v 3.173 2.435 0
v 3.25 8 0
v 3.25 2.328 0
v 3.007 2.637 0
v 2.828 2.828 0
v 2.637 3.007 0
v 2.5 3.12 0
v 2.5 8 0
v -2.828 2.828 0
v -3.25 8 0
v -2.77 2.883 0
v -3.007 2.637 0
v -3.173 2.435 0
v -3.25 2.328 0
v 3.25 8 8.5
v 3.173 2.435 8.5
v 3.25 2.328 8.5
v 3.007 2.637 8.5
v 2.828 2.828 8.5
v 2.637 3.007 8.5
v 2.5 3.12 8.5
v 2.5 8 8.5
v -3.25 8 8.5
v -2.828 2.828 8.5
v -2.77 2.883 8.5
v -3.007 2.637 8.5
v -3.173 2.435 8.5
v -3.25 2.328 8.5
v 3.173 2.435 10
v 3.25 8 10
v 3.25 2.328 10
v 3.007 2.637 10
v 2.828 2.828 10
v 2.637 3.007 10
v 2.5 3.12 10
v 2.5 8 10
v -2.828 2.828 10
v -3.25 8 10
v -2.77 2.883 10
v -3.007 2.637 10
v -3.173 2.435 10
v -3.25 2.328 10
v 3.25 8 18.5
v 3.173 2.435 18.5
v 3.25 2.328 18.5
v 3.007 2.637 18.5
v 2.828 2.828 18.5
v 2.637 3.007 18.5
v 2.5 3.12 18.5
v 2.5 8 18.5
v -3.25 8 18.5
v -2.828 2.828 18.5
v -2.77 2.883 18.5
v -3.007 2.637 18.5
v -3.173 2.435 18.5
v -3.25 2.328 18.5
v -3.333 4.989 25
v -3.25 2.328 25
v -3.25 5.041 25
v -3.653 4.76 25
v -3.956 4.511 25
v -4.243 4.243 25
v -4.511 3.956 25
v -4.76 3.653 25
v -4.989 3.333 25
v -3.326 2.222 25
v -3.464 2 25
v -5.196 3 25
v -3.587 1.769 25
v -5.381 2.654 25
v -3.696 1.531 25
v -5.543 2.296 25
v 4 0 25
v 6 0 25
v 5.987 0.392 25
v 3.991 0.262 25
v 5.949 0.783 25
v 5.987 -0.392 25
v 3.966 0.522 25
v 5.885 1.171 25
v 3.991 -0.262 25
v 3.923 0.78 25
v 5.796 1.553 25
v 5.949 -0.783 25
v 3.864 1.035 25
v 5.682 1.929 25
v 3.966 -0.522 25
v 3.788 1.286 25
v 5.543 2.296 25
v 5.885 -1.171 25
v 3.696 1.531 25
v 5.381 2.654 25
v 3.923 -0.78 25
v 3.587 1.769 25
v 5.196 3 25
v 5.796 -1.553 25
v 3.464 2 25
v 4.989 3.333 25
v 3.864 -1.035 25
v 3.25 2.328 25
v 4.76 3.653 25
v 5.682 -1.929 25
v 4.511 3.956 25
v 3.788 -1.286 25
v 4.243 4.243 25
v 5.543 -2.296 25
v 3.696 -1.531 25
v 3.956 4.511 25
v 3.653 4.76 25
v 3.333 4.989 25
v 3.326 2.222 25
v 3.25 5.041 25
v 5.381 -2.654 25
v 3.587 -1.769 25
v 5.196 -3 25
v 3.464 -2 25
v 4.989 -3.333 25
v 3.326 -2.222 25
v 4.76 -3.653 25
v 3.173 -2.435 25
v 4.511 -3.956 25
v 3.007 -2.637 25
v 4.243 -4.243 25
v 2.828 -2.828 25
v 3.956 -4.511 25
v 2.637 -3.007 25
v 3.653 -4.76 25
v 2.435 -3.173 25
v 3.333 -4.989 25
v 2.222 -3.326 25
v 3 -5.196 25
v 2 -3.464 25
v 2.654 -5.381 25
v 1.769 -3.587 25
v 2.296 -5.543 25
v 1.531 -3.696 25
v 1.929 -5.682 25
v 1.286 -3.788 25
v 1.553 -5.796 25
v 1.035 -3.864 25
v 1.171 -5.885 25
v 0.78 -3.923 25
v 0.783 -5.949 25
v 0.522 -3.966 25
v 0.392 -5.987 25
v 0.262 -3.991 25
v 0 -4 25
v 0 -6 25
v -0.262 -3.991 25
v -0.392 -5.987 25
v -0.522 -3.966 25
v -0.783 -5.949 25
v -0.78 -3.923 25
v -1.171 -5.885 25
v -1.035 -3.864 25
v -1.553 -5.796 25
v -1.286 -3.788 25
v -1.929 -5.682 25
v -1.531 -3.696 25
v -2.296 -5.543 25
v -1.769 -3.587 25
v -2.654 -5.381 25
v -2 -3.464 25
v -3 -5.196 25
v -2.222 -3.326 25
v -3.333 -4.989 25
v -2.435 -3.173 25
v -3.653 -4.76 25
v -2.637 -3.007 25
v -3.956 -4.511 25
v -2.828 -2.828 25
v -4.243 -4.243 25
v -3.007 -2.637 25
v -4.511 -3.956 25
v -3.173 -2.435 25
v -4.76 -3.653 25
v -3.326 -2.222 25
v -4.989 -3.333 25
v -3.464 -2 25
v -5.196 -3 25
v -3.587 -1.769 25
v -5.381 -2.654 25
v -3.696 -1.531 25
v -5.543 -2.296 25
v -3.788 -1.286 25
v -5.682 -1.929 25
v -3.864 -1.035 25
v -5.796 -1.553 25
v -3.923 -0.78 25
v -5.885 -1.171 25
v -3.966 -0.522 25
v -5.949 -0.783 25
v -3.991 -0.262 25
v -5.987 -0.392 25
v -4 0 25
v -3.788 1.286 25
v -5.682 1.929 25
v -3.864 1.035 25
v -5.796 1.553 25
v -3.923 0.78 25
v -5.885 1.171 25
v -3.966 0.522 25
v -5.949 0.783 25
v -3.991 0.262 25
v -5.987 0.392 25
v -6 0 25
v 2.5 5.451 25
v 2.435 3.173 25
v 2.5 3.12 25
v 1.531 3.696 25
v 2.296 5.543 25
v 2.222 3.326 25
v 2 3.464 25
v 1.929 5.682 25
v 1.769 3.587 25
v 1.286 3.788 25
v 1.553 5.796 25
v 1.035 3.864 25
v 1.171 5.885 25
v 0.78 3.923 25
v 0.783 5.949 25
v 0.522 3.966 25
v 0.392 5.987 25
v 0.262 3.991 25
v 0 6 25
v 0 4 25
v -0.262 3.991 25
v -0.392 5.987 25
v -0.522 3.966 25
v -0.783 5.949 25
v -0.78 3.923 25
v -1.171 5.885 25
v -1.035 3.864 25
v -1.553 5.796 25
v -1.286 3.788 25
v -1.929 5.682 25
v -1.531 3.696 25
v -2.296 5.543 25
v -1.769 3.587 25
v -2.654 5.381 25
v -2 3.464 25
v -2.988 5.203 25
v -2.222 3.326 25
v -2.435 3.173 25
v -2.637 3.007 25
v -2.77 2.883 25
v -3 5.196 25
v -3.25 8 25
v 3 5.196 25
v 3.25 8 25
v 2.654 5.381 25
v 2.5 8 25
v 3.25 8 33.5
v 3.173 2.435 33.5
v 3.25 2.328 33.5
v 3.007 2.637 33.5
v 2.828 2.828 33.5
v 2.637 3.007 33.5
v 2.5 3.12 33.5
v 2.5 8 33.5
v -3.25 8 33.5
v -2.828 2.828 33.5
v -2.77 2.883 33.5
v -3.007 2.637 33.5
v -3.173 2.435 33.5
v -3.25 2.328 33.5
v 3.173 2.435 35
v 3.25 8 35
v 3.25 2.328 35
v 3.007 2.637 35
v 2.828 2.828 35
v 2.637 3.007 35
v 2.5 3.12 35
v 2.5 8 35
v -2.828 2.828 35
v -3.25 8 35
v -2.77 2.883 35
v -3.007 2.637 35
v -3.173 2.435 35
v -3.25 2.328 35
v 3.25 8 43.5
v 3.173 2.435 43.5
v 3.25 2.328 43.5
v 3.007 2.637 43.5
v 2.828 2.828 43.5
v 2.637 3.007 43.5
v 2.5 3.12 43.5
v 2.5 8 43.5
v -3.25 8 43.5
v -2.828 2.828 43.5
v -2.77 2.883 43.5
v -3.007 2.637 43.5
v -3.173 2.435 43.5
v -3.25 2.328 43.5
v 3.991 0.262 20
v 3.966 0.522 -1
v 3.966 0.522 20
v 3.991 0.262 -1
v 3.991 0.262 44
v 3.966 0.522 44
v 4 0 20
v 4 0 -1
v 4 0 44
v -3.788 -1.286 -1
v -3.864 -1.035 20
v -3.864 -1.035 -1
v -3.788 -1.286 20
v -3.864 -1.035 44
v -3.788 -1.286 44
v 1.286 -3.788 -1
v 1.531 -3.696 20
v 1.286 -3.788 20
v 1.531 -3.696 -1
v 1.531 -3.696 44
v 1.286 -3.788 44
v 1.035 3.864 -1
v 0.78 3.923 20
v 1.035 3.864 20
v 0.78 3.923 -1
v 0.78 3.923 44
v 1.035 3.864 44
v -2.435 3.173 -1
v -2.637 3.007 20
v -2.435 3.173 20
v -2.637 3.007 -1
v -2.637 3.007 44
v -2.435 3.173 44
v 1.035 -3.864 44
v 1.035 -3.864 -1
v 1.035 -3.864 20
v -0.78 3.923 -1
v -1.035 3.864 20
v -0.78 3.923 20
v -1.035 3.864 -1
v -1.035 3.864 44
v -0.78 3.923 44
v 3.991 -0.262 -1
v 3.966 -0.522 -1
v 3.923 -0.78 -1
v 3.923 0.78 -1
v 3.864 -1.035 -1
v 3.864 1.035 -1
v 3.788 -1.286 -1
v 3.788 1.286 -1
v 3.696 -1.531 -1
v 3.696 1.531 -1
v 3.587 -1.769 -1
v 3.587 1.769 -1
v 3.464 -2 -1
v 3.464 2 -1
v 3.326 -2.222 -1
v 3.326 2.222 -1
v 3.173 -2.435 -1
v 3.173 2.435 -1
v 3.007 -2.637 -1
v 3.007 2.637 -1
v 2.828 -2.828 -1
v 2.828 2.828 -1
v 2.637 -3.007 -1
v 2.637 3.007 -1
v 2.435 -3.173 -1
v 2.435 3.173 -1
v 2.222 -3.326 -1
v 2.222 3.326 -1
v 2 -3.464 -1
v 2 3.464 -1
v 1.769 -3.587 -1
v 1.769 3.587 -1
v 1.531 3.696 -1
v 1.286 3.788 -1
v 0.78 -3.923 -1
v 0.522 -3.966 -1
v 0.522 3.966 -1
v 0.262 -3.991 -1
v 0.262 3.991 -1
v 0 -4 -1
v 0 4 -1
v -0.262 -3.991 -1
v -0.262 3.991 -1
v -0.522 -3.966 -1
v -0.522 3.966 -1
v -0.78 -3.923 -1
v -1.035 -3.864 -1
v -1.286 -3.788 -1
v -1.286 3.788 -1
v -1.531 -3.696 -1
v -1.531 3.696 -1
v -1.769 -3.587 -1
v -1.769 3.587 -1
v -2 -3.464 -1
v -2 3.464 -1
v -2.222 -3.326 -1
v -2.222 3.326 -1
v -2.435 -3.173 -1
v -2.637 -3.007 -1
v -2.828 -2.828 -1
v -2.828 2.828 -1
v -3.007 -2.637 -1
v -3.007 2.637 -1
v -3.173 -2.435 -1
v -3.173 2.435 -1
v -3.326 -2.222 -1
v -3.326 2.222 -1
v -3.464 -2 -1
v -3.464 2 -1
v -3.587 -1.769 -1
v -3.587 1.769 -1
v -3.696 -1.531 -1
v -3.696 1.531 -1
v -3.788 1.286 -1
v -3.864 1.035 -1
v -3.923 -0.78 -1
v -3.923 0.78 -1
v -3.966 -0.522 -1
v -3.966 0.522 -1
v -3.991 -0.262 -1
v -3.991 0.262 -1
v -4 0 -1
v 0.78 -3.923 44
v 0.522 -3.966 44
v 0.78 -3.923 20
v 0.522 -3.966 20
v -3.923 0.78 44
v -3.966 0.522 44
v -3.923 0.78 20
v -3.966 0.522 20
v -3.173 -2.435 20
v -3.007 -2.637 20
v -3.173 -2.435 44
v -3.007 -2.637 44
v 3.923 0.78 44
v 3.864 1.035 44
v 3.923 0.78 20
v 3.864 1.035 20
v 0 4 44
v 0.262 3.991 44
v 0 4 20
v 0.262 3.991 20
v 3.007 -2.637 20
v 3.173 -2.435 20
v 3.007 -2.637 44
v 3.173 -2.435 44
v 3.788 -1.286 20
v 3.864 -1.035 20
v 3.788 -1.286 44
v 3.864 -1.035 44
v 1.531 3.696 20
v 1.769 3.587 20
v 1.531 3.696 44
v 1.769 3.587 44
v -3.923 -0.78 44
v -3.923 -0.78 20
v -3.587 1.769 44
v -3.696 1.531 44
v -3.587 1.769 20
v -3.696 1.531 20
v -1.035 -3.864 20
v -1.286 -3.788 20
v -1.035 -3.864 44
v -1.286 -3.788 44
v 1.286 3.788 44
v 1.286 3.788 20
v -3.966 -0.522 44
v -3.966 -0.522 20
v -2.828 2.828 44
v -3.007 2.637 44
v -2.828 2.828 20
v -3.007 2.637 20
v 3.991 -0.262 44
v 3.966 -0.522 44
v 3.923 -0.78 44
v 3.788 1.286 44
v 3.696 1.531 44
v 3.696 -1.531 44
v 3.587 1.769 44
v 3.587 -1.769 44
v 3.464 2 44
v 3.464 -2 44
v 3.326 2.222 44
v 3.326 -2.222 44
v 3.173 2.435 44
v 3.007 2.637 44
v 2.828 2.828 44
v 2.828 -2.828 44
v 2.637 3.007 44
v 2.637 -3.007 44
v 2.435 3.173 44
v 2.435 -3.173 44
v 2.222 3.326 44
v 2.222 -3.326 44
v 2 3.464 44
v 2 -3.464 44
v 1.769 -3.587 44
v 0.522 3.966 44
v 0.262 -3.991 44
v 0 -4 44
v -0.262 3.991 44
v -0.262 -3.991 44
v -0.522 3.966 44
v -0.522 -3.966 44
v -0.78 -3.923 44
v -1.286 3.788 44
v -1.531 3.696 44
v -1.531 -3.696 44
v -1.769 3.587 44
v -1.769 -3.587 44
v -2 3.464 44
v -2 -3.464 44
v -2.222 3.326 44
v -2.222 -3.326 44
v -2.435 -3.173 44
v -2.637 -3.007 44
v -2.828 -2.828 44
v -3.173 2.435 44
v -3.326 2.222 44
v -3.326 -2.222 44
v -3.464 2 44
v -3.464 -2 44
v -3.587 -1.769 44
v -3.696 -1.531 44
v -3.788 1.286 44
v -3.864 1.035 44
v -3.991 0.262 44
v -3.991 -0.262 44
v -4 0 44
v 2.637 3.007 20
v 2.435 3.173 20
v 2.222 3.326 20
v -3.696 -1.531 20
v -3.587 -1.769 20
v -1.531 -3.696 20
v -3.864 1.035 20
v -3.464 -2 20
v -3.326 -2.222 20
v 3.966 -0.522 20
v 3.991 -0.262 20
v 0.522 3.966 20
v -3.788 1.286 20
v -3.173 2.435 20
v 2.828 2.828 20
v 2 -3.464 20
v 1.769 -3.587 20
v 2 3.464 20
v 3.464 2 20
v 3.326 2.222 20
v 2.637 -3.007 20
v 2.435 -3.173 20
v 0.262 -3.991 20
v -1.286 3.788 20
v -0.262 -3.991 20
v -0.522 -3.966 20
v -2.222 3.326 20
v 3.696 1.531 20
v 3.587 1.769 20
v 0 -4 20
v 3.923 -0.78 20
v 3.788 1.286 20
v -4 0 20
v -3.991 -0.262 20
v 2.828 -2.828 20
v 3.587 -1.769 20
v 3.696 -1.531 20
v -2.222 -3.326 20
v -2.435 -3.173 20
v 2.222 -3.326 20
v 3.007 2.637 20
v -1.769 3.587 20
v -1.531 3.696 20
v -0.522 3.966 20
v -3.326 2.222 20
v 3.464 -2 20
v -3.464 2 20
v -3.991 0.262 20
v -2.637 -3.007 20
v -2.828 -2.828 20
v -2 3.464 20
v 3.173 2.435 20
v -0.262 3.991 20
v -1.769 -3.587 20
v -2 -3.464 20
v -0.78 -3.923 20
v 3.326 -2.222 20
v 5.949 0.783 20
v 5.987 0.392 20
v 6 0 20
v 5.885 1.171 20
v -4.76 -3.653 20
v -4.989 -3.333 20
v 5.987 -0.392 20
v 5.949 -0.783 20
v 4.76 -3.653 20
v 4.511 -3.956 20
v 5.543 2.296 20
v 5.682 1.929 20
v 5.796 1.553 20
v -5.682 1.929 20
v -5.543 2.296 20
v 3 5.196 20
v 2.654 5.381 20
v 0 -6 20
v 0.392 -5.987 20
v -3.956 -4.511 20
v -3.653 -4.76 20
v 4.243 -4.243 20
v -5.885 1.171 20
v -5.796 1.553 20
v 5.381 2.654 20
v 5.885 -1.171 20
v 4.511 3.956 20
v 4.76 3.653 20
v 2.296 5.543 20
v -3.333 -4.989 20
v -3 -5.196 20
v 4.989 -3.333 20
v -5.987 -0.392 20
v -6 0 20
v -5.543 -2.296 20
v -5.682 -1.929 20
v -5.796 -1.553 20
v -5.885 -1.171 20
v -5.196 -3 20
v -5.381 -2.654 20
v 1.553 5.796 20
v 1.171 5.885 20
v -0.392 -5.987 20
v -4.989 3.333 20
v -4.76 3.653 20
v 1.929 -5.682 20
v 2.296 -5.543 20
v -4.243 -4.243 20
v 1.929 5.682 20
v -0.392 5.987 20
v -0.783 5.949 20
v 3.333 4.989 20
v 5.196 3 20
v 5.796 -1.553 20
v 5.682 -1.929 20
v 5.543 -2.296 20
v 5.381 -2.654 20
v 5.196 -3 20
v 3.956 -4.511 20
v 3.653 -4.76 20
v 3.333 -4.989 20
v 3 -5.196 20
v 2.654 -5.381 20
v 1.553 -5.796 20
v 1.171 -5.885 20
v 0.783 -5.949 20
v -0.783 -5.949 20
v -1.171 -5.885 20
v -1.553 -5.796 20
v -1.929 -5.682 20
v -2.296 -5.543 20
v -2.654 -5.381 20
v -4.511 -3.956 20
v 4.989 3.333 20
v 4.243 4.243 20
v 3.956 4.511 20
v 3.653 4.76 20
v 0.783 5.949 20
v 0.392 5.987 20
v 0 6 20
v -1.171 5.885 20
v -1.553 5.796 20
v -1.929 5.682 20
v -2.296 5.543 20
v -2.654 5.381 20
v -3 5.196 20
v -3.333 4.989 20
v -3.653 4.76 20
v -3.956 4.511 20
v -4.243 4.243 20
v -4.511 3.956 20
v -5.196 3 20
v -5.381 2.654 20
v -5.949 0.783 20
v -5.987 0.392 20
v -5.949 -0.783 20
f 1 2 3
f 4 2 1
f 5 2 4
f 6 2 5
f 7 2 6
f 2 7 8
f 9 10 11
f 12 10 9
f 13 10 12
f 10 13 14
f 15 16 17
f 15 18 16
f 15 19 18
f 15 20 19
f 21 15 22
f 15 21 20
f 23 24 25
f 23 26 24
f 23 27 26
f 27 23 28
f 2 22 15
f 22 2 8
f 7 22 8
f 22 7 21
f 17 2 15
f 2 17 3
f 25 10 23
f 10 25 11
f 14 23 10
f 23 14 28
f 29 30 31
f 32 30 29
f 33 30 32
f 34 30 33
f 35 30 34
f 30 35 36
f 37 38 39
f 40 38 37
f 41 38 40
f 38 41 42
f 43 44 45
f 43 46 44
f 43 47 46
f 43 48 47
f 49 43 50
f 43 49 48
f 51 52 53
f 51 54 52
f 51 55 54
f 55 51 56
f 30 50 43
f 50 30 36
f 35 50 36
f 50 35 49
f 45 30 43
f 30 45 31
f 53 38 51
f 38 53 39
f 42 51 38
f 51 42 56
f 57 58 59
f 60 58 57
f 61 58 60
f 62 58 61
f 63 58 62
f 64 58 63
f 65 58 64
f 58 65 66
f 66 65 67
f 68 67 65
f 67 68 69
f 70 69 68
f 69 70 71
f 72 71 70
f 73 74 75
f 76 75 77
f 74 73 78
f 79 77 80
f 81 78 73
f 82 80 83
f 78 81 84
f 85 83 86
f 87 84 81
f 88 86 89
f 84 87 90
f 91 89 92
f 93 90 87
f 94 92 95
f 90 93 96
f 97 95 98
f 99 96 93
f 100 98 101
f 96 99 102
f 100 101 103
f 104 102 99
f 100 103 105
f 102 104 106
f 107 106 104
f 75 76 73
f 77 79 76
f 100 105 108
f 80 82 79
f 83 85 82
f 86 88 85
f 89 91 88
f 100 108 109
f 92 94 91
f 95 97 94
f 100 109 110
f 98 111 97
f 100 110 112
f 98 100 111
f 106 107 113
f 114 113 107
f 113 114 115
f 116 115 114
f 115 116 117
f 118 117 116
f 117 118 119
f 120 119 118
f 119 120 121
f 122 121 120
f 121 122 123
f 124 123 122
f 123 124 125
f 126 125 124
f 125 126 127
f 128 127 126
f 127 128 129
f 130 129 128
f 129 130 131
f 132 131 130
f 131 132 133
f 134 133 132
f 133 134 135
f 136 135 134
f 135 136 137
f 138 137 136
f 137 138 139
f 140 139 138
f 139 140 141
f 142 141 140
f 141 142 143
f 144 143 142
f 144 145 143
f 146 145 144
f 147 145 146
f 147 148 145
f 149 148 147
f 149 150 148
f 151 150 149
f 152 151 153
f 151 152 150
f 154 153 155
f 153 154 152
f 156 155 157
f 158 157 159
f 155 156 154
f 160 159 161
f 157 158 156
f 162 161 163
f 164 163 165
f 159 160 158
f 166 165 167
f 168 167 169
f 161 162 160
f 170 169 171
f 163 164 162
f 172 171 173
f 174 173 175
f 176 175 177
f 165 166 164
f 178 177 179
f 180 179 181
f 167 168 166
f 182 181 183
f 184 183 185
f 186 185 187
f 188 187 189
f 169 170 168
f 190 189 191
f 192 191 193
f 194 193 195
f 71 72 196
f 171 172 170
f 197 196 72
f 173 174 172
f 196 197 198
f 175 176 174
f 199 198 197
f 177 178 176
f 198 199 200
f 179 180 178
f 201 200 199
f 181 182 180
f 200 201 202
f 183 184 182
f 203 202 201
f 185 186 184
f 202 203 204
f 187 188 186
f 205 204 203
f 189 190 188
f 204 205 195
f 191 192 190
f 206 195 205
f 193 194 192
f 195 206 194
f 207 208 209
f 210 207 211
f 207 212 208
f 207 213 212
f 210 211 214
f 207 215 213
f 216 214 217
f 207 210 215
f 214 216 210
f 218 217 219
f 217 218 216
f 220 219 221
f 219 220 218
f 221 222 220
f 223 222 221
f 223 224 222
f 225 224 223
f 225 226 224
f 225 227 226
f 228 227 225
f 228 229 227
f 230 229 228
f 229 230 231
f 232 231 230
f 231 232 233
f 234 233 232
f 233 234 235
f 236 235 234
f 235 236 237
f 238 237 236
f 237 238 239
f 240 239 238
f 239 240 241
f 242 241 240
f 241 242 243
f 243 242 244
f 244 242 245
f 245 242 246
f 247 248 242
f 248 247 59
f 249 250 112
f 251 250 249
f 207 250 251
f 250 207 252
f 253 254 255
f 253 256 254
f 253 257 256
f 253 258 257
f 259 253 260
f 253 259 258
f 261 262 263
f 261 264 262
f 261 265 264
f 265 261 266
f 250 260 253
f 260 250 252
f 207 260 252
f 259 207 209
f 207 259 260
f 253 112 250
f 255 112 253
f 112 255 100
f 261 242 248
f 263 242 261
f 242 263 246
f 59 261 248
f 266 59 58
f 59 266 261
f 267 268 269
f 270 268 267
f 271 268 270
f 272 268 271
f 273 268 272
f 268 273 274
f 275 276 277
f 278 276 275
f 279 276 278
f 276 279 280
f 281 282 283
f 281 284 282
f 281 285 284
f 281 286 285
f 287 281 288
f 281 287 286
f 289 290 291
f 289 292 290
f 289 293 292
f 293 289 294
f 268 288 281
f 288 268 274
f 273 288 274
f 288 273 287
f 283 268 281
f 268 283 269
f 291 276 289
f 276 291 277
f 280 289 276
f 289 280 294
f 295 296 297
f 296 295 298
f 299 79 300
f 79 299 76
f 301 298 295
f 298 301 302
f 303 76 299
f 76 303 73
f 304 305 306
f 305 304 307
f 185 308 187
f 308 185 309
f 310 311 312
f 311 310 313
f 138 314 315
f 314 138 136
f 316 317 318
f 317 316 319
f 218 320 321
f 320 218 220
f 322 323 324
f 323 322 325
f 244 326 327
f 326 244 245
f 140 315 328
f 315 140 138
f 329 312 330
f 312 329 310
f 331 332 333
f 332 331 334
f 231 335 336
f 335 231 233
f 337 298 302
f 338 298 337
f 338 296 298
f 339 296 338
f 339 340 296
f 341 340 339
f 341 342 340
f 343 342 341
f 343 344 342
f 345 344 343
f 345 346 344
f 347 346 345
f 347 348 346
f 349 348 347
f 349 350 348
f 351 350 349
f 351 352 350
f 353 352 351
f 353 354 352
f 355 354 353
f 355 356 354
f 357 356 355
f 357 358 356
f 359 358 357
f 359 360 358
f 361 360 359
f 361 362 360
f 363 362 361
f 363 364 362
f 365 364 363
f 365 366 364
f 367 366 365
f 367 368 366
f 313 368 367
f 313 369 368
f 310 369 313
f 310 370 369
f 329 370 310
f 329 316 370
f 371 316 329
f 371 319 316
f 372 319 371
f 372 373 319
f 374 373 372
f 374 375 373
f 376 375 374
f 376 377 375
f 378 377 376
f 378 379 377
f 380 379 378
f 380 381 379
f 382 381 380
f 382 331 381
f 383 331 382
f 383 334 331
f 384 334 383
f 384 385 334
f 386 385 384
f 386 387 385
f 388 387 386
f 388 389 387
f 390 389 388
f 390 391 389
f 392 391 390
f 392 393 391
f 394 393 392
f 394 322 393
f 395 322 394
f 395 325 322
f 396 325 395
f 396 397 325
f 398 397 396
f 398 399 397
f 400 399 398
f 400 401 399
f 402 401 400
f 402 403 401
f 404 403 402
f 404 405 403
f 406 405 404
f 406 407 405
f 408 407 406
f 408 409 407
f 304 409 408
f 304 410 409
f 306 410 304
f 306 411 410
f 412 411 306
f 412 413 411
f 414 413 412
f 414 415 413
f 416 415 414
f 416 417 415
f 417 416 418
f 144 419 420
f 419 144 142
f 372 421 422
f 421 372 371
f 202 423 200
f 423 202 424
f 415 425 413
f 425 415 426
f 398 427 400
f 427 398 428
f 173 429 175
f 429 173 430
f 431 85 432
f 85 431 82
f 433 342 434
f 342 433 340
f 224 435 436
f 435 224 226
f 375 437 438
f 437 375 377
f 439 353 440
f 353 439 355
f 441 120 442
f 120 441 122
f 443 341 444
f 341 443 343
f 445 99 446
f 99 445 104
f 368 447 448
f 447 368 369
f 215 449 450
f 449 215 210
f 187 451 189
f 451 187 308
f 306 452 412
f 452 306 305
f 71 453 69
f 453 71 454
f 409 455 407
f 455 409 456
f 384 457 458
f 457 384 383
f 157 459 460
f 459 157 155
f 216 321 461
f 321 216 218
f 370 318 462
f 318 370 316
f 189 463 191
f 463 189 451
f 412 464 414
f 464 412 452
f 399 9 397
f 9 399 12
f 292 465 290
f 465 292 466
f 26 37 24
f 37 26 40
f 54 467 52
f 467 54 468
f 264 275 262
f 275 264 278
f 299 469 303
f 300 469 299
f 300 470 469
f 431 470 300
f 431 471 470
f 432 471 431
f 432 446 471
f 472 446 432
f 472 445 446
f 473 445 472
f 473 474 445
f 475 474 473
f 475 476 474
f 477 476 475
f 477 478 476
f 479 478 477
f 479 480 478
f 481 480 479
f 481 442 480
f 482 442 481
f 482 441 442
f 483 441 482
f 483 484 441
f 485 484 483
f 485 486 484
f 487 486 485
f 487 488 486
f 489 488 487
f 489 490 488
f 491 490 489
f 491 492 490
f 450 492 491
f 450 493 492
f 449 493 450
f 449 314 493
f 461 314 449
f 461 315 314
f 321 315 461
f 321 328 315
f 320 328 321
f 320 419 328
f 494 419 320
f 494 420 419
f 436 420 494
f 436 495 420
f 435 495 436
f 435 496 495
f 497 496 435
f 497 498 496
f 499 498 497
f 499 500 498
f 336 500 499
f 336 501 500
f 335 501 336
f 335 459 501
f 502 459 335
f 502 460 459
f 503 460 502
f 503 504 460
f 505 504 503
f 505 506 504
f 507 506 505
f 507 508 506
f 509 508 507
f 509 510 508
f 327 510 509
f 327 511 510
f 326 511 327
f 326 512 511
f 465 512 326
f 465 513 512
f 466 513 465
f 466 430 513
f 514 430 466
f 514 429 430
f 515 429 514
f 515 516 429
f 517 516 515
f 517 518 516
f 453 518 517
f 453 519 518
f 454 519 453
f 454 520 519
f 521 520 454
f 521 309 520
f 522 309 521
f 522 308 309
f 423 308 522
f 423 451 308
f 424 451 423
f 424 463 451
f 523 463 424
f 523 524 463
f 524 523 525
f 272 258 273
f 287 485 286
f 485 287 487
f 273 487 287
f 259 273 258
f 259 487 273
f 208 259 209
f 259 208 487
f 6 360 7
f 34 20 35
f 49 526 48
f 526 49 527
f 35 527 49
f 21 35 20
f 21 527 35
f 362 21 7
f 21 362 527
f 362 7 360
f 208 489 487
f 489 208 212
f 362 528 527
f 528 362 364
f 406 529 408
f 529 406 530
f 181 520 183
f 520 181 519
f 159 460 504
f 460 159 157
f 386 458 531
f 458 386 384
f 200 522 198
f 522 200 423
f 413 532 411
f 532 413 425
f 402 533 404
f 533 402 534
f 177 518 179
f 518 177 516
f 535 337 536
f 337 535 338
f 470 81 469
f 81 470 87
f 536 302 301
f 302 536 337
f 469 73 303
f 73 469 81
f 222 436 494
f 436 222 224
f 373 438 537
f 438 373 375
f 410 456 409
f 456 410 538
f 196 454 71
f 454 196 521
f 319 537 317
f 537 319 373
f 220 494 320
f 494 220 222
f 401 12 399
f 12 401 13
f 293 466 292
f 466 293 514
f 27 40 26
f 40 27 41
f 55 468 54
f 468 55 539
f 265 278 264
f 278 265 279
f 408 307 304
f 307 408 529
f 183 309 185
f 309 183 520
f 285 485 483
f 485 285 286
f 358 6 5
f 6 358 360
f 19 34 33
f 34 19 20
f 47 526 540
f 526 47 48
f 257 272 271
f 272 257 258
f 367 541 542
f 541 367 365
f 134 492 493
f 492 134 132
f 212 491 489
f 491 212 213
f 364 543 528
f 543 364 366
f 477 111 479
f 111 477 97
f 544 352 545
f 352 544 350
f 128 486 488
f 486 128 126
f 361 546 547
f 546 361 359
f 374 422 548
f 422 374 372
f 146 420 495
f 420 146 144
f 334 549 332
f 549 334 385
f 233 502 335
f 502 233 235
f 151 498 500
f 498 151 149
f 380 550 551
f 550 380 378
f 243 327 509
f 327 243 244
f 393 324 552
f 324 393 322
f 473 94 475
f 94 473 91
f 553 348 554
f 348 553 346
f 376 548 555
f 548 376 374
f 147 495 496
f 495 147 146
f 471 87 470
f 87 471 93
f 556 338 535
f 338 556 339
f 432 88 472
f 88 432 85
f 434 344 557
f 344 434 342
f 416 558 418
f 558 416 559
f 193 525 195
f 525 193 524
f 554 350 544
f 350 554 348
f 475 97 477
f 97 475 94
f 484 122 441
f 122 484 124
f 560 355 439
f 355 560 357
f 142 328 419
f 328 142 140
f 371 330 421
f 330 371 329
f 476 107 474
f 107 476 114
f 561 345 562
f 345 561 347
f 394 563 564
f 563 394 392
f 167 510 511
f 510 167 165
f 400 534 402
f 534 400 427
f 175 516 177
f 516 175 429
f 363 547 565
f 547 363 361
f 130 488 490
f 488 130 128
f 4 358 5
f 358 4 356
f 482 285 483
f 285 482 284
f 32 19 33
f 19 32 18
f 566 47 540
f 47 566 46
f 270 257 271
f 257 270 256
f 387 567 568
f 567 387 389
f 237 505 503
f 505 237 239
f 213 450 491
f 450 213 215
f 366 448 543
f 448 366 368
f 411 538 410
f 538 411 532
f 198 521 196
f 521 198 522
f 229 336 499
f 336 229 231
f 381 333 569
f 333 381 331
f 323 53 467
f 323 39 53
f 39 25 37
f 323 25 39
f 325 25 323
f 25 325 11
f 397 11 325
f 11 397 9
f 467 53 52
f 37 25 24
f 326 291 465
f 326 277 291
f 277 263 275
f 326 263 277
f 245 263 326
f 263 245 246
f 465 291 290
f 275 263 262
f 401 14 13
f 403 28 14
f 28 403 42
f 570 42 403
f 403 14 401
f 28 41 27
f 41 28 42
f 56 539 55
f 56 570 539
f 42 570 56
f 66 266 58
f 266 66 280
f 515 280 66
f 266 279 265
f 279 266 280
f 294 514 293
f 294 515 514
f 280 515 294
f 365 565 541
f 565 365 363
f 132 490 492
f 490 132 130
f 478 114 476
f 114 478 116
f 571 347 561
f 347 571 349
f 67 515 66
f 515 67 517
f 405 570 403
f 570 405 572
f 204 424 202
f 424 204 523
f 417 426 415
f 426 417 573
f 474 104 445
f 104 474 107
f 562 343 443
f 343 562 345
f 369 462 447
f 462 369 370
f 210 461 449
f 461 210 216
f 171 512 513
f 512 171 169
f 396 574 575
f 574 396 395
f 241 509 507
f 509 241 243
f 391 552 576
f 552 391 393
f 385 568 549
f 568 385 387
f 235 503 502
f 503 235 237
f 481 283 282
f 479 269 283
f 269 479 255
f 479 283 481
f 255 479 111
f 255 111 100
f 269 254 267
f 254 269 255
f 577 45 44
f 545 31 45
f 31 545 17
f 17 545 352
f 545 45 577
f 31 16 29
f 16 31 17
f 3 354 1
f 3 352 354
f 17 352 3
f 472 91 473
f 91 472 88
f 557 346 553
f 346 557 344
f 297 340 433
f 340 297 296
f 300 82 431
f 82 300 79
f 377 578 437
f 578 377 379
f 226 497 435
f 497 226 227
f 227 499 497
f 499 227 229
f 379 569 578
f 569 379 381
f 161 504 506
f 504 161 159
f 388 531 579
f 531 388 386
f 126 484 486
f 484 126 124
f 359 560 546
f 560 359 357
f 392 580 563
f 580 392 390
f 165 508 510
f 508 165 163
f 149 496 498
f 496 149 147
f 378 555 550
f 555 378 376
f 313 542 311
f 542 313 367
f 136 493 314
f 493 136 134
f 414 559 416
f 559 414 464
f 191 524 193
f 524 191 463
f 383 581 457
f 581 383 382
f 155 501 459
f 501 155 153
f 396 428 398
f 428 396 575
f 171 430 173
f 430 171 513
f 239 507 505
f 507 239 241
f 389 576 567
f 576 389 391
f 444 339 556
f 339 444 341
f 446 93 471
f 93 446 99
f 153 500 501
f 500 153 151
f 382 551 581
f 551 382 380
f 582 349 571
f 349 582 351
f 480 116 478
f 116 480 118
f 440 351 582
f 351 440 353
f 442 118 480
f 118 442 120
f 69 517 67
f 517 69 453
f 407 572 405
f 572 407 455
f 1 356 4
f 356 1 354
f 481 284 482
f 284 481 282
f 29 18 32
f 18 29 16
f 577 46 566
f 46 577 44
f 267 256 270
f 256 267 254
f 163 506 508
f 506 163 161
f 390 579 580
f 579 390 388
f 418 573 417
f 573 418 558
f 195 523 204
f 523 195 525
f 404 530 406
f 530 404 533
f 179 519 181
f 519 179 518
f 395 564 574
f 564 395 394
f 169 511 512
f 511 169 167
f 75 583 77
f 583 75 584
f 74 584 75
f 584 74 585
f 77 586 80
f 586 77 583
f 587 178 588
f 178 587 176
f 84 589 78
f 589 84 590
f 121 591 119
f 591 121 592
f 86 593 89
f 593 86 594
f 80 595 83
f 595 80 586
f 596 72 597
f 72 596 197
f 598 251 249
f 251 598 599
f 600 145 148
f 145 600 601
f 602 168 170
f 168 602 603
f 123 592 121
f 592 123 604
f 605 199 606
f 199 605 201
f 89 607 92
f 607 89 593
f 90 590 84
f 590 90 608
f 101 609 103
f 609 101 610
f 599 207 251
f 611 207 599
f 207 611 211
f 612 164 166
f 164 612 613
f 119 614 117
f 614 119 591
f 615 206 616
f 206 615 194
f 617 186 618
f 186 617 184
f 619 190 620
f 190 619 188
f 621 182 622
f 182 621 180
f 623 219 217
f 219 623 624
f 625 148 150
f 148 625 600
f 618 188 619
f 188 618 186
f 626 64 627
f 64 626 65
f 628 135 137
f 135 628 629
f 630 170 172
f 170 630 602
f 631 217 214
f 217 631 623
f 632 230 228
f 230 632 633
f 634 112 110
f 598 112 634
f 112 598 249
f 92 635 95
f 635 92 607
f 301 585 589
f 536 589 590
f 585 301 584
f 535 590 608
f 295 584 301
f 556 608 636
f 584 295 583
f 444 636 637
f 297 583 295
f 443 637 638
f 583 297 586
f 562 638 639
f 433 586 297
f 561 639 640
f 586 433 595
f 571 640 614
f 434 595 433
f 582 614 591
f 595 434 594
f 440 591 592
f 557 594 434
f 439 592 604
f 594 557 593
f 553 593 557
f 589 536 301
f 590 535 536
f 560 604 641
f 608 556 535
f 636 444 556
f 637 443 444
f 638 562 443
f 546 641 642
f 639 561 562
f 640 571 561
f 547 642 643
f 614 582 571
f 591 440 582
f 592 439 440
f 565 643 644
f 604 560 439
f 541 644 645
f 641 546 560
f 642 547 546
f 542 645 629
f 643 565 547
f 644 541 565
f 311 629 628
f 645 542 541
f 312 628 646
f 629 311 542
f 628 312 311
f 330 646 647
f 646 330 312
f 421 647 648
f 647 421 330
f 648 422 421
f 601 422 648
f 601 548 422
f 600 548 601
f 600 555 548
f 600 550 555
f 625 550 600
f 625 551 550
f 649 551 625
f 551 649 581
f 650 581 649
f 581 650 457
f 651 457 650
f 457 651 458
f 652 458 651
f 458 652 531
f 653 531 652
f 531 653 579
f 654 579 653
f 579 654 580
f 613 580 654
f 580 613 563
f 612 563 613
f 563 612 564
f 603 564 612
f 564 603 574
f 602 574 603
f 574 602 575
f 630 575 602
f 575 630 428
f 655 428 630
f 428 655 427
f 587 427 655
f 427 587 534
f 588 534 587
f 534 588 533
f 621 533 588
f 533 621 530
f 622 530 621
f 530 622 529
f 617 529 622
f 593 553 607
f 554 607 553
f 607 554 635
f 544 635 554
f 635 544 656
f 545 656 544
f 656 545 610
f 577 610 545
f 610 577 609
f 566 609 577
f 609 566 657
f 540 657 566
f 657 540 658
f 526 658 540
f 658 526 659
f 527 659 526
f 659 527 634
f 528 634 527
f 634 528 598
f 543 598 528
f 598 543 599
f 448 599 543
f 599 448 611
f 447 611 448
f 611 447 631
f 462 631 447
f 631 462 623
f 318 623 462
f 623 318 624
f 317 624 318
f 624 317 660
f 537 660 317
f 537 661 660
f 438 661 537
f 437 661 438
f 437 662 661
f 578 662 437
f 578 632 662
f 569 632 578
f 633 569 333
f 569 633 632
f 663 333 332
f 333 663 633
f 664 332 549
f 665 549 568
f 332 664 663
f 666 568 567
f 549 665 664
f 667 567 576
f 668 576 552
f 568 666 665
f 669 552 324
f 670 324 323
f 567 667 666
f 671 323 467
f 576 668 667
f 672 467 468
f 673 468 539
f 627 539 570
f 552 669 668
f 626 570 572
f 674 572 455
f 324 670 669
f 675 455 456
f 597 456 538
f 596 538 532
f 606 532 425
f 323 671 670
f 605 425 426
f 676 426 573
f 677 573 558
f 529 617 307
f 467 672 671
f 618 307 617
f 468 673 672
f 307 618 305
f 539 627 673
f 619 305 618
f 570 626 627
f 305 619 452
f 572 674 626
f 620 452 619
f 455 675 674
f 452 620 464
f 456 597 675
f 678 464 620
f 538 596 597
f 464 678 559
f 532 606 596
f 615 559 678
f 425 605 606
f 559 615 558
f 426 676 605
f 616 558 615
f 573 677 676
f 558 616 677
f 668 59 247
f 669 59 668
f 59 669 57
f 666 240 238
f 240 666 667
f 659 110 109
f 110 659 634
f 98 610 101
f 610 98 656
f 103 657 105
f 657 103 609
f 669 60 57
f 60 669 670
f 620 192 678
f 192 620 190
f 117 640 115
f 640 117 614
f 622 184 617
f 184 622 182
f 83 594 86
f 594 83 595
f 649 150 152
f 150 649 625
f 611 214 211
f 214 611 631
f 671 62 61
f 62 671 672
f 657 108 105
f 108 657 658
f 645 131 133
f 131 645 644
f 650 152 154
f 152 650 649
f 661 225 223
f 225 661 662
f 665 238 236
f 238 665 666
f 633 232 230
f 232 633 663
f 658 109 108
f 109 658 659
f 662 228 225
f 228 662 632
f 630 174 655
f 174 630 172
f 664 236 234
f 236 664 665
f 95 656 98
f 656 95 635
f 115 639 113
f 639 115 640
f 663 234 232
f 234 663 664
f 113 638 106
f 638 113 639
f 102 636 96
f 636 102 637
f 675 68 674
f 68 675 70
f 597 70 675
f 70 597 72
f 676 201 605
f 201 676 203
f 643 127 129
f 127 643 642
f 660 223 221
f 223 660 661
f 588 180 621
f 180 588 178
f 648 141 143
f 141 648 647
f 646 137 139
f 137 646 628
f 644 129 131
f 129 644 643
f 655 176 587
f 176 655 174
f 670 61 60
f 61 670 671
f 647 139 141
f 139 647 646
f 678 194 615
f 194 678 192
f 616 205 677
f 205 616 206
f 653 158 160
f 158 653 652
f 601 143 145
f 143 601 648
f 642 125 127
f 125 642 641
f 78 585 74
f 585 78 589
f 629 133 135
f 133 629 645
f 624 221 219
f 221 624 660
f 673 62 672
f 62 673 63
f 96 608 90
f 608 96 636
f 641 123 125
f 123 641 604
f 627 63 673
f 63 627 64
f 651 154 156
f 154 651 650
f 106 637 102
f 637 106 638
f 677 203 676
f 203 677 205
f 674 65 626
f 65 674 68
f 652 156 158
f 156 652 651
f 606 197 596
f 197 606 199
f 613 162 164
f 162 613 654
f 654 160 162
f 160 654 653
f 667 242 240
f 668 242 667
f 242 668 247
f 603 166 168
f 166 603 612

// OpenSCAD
// Hose-barb reducer: 8 mm ID -> 5 mm ID
// Print orientation: standing upright along +Z

$fn = 96;

// ---- Dimensions (mm) ----
reducer_id      = 8;     // main bore (8 mm tubing)
collar_d        = 12;    // collar outer diameter
collar_h        = 5;     // collar height (z = 20..25)
small_id        = 5;     // small end bore (5 mm tubing)
small_barb_h    = 8;     // small barb height
small_barb_od   = 6.5;   // small barb outer diameter (bottom)
small_barb_tip  = 5.0;   // small barb tip outer diameter (top)
overlap         = 0.5;   // barb overlap into collar for a clean union

// ---- Model ----
union() {
    // Main bore through full length
    translate([0, 0, -1])
        cylinder(h = 45, d = reducer_id);

    // Collar (z = 20..25)
    translate([0, 0, 20])
        cylinder(h = collar_h, d = collar_d);

    // 8 mm tubing barbs (z = 0..20)
    for (z = [0, 10])
        translate([0, 0, z])
            linear_extrude(height = small_barb_h + overlap)
                polygon(points = [
                    [-small_barb_od / 2, 0],
                    [ small_barb_od / 2, 0],
                    [ small_barb_od / 2, small_barb_h],
                    [ small_barb_tip / 2, small_barb_h],
                    [ small_barb_tip / 2, 0],
                    [-small_barb_tip / 2, 0],
                    [-small_barb_od / 2, small_barb_h],
                    [-small_barb_od / 2, 0]
                ]);

    // 5 mm tubing barbs (z = 25..41)
    for (z = [25, 35])
        translate([0, 0, z])
            linear_extrude(height = small_barb_h + overlap)
                polygon(points = [
                    [-small_barb_od / 2, 0],
                    [ small_barb_od / 2, 0],
                    [ small_barb_od / 2, small_barb_h],
                    [ small_barb_tip / 2, small_barb_h],
                    [ small_barb_tip / 2, 0],
                    [-small_barb_tip / 2, 0],
                    [-small_barb_od / 2, small_barb_h],
                    [-small_barb_od / 2, 0]
                ]);
}
